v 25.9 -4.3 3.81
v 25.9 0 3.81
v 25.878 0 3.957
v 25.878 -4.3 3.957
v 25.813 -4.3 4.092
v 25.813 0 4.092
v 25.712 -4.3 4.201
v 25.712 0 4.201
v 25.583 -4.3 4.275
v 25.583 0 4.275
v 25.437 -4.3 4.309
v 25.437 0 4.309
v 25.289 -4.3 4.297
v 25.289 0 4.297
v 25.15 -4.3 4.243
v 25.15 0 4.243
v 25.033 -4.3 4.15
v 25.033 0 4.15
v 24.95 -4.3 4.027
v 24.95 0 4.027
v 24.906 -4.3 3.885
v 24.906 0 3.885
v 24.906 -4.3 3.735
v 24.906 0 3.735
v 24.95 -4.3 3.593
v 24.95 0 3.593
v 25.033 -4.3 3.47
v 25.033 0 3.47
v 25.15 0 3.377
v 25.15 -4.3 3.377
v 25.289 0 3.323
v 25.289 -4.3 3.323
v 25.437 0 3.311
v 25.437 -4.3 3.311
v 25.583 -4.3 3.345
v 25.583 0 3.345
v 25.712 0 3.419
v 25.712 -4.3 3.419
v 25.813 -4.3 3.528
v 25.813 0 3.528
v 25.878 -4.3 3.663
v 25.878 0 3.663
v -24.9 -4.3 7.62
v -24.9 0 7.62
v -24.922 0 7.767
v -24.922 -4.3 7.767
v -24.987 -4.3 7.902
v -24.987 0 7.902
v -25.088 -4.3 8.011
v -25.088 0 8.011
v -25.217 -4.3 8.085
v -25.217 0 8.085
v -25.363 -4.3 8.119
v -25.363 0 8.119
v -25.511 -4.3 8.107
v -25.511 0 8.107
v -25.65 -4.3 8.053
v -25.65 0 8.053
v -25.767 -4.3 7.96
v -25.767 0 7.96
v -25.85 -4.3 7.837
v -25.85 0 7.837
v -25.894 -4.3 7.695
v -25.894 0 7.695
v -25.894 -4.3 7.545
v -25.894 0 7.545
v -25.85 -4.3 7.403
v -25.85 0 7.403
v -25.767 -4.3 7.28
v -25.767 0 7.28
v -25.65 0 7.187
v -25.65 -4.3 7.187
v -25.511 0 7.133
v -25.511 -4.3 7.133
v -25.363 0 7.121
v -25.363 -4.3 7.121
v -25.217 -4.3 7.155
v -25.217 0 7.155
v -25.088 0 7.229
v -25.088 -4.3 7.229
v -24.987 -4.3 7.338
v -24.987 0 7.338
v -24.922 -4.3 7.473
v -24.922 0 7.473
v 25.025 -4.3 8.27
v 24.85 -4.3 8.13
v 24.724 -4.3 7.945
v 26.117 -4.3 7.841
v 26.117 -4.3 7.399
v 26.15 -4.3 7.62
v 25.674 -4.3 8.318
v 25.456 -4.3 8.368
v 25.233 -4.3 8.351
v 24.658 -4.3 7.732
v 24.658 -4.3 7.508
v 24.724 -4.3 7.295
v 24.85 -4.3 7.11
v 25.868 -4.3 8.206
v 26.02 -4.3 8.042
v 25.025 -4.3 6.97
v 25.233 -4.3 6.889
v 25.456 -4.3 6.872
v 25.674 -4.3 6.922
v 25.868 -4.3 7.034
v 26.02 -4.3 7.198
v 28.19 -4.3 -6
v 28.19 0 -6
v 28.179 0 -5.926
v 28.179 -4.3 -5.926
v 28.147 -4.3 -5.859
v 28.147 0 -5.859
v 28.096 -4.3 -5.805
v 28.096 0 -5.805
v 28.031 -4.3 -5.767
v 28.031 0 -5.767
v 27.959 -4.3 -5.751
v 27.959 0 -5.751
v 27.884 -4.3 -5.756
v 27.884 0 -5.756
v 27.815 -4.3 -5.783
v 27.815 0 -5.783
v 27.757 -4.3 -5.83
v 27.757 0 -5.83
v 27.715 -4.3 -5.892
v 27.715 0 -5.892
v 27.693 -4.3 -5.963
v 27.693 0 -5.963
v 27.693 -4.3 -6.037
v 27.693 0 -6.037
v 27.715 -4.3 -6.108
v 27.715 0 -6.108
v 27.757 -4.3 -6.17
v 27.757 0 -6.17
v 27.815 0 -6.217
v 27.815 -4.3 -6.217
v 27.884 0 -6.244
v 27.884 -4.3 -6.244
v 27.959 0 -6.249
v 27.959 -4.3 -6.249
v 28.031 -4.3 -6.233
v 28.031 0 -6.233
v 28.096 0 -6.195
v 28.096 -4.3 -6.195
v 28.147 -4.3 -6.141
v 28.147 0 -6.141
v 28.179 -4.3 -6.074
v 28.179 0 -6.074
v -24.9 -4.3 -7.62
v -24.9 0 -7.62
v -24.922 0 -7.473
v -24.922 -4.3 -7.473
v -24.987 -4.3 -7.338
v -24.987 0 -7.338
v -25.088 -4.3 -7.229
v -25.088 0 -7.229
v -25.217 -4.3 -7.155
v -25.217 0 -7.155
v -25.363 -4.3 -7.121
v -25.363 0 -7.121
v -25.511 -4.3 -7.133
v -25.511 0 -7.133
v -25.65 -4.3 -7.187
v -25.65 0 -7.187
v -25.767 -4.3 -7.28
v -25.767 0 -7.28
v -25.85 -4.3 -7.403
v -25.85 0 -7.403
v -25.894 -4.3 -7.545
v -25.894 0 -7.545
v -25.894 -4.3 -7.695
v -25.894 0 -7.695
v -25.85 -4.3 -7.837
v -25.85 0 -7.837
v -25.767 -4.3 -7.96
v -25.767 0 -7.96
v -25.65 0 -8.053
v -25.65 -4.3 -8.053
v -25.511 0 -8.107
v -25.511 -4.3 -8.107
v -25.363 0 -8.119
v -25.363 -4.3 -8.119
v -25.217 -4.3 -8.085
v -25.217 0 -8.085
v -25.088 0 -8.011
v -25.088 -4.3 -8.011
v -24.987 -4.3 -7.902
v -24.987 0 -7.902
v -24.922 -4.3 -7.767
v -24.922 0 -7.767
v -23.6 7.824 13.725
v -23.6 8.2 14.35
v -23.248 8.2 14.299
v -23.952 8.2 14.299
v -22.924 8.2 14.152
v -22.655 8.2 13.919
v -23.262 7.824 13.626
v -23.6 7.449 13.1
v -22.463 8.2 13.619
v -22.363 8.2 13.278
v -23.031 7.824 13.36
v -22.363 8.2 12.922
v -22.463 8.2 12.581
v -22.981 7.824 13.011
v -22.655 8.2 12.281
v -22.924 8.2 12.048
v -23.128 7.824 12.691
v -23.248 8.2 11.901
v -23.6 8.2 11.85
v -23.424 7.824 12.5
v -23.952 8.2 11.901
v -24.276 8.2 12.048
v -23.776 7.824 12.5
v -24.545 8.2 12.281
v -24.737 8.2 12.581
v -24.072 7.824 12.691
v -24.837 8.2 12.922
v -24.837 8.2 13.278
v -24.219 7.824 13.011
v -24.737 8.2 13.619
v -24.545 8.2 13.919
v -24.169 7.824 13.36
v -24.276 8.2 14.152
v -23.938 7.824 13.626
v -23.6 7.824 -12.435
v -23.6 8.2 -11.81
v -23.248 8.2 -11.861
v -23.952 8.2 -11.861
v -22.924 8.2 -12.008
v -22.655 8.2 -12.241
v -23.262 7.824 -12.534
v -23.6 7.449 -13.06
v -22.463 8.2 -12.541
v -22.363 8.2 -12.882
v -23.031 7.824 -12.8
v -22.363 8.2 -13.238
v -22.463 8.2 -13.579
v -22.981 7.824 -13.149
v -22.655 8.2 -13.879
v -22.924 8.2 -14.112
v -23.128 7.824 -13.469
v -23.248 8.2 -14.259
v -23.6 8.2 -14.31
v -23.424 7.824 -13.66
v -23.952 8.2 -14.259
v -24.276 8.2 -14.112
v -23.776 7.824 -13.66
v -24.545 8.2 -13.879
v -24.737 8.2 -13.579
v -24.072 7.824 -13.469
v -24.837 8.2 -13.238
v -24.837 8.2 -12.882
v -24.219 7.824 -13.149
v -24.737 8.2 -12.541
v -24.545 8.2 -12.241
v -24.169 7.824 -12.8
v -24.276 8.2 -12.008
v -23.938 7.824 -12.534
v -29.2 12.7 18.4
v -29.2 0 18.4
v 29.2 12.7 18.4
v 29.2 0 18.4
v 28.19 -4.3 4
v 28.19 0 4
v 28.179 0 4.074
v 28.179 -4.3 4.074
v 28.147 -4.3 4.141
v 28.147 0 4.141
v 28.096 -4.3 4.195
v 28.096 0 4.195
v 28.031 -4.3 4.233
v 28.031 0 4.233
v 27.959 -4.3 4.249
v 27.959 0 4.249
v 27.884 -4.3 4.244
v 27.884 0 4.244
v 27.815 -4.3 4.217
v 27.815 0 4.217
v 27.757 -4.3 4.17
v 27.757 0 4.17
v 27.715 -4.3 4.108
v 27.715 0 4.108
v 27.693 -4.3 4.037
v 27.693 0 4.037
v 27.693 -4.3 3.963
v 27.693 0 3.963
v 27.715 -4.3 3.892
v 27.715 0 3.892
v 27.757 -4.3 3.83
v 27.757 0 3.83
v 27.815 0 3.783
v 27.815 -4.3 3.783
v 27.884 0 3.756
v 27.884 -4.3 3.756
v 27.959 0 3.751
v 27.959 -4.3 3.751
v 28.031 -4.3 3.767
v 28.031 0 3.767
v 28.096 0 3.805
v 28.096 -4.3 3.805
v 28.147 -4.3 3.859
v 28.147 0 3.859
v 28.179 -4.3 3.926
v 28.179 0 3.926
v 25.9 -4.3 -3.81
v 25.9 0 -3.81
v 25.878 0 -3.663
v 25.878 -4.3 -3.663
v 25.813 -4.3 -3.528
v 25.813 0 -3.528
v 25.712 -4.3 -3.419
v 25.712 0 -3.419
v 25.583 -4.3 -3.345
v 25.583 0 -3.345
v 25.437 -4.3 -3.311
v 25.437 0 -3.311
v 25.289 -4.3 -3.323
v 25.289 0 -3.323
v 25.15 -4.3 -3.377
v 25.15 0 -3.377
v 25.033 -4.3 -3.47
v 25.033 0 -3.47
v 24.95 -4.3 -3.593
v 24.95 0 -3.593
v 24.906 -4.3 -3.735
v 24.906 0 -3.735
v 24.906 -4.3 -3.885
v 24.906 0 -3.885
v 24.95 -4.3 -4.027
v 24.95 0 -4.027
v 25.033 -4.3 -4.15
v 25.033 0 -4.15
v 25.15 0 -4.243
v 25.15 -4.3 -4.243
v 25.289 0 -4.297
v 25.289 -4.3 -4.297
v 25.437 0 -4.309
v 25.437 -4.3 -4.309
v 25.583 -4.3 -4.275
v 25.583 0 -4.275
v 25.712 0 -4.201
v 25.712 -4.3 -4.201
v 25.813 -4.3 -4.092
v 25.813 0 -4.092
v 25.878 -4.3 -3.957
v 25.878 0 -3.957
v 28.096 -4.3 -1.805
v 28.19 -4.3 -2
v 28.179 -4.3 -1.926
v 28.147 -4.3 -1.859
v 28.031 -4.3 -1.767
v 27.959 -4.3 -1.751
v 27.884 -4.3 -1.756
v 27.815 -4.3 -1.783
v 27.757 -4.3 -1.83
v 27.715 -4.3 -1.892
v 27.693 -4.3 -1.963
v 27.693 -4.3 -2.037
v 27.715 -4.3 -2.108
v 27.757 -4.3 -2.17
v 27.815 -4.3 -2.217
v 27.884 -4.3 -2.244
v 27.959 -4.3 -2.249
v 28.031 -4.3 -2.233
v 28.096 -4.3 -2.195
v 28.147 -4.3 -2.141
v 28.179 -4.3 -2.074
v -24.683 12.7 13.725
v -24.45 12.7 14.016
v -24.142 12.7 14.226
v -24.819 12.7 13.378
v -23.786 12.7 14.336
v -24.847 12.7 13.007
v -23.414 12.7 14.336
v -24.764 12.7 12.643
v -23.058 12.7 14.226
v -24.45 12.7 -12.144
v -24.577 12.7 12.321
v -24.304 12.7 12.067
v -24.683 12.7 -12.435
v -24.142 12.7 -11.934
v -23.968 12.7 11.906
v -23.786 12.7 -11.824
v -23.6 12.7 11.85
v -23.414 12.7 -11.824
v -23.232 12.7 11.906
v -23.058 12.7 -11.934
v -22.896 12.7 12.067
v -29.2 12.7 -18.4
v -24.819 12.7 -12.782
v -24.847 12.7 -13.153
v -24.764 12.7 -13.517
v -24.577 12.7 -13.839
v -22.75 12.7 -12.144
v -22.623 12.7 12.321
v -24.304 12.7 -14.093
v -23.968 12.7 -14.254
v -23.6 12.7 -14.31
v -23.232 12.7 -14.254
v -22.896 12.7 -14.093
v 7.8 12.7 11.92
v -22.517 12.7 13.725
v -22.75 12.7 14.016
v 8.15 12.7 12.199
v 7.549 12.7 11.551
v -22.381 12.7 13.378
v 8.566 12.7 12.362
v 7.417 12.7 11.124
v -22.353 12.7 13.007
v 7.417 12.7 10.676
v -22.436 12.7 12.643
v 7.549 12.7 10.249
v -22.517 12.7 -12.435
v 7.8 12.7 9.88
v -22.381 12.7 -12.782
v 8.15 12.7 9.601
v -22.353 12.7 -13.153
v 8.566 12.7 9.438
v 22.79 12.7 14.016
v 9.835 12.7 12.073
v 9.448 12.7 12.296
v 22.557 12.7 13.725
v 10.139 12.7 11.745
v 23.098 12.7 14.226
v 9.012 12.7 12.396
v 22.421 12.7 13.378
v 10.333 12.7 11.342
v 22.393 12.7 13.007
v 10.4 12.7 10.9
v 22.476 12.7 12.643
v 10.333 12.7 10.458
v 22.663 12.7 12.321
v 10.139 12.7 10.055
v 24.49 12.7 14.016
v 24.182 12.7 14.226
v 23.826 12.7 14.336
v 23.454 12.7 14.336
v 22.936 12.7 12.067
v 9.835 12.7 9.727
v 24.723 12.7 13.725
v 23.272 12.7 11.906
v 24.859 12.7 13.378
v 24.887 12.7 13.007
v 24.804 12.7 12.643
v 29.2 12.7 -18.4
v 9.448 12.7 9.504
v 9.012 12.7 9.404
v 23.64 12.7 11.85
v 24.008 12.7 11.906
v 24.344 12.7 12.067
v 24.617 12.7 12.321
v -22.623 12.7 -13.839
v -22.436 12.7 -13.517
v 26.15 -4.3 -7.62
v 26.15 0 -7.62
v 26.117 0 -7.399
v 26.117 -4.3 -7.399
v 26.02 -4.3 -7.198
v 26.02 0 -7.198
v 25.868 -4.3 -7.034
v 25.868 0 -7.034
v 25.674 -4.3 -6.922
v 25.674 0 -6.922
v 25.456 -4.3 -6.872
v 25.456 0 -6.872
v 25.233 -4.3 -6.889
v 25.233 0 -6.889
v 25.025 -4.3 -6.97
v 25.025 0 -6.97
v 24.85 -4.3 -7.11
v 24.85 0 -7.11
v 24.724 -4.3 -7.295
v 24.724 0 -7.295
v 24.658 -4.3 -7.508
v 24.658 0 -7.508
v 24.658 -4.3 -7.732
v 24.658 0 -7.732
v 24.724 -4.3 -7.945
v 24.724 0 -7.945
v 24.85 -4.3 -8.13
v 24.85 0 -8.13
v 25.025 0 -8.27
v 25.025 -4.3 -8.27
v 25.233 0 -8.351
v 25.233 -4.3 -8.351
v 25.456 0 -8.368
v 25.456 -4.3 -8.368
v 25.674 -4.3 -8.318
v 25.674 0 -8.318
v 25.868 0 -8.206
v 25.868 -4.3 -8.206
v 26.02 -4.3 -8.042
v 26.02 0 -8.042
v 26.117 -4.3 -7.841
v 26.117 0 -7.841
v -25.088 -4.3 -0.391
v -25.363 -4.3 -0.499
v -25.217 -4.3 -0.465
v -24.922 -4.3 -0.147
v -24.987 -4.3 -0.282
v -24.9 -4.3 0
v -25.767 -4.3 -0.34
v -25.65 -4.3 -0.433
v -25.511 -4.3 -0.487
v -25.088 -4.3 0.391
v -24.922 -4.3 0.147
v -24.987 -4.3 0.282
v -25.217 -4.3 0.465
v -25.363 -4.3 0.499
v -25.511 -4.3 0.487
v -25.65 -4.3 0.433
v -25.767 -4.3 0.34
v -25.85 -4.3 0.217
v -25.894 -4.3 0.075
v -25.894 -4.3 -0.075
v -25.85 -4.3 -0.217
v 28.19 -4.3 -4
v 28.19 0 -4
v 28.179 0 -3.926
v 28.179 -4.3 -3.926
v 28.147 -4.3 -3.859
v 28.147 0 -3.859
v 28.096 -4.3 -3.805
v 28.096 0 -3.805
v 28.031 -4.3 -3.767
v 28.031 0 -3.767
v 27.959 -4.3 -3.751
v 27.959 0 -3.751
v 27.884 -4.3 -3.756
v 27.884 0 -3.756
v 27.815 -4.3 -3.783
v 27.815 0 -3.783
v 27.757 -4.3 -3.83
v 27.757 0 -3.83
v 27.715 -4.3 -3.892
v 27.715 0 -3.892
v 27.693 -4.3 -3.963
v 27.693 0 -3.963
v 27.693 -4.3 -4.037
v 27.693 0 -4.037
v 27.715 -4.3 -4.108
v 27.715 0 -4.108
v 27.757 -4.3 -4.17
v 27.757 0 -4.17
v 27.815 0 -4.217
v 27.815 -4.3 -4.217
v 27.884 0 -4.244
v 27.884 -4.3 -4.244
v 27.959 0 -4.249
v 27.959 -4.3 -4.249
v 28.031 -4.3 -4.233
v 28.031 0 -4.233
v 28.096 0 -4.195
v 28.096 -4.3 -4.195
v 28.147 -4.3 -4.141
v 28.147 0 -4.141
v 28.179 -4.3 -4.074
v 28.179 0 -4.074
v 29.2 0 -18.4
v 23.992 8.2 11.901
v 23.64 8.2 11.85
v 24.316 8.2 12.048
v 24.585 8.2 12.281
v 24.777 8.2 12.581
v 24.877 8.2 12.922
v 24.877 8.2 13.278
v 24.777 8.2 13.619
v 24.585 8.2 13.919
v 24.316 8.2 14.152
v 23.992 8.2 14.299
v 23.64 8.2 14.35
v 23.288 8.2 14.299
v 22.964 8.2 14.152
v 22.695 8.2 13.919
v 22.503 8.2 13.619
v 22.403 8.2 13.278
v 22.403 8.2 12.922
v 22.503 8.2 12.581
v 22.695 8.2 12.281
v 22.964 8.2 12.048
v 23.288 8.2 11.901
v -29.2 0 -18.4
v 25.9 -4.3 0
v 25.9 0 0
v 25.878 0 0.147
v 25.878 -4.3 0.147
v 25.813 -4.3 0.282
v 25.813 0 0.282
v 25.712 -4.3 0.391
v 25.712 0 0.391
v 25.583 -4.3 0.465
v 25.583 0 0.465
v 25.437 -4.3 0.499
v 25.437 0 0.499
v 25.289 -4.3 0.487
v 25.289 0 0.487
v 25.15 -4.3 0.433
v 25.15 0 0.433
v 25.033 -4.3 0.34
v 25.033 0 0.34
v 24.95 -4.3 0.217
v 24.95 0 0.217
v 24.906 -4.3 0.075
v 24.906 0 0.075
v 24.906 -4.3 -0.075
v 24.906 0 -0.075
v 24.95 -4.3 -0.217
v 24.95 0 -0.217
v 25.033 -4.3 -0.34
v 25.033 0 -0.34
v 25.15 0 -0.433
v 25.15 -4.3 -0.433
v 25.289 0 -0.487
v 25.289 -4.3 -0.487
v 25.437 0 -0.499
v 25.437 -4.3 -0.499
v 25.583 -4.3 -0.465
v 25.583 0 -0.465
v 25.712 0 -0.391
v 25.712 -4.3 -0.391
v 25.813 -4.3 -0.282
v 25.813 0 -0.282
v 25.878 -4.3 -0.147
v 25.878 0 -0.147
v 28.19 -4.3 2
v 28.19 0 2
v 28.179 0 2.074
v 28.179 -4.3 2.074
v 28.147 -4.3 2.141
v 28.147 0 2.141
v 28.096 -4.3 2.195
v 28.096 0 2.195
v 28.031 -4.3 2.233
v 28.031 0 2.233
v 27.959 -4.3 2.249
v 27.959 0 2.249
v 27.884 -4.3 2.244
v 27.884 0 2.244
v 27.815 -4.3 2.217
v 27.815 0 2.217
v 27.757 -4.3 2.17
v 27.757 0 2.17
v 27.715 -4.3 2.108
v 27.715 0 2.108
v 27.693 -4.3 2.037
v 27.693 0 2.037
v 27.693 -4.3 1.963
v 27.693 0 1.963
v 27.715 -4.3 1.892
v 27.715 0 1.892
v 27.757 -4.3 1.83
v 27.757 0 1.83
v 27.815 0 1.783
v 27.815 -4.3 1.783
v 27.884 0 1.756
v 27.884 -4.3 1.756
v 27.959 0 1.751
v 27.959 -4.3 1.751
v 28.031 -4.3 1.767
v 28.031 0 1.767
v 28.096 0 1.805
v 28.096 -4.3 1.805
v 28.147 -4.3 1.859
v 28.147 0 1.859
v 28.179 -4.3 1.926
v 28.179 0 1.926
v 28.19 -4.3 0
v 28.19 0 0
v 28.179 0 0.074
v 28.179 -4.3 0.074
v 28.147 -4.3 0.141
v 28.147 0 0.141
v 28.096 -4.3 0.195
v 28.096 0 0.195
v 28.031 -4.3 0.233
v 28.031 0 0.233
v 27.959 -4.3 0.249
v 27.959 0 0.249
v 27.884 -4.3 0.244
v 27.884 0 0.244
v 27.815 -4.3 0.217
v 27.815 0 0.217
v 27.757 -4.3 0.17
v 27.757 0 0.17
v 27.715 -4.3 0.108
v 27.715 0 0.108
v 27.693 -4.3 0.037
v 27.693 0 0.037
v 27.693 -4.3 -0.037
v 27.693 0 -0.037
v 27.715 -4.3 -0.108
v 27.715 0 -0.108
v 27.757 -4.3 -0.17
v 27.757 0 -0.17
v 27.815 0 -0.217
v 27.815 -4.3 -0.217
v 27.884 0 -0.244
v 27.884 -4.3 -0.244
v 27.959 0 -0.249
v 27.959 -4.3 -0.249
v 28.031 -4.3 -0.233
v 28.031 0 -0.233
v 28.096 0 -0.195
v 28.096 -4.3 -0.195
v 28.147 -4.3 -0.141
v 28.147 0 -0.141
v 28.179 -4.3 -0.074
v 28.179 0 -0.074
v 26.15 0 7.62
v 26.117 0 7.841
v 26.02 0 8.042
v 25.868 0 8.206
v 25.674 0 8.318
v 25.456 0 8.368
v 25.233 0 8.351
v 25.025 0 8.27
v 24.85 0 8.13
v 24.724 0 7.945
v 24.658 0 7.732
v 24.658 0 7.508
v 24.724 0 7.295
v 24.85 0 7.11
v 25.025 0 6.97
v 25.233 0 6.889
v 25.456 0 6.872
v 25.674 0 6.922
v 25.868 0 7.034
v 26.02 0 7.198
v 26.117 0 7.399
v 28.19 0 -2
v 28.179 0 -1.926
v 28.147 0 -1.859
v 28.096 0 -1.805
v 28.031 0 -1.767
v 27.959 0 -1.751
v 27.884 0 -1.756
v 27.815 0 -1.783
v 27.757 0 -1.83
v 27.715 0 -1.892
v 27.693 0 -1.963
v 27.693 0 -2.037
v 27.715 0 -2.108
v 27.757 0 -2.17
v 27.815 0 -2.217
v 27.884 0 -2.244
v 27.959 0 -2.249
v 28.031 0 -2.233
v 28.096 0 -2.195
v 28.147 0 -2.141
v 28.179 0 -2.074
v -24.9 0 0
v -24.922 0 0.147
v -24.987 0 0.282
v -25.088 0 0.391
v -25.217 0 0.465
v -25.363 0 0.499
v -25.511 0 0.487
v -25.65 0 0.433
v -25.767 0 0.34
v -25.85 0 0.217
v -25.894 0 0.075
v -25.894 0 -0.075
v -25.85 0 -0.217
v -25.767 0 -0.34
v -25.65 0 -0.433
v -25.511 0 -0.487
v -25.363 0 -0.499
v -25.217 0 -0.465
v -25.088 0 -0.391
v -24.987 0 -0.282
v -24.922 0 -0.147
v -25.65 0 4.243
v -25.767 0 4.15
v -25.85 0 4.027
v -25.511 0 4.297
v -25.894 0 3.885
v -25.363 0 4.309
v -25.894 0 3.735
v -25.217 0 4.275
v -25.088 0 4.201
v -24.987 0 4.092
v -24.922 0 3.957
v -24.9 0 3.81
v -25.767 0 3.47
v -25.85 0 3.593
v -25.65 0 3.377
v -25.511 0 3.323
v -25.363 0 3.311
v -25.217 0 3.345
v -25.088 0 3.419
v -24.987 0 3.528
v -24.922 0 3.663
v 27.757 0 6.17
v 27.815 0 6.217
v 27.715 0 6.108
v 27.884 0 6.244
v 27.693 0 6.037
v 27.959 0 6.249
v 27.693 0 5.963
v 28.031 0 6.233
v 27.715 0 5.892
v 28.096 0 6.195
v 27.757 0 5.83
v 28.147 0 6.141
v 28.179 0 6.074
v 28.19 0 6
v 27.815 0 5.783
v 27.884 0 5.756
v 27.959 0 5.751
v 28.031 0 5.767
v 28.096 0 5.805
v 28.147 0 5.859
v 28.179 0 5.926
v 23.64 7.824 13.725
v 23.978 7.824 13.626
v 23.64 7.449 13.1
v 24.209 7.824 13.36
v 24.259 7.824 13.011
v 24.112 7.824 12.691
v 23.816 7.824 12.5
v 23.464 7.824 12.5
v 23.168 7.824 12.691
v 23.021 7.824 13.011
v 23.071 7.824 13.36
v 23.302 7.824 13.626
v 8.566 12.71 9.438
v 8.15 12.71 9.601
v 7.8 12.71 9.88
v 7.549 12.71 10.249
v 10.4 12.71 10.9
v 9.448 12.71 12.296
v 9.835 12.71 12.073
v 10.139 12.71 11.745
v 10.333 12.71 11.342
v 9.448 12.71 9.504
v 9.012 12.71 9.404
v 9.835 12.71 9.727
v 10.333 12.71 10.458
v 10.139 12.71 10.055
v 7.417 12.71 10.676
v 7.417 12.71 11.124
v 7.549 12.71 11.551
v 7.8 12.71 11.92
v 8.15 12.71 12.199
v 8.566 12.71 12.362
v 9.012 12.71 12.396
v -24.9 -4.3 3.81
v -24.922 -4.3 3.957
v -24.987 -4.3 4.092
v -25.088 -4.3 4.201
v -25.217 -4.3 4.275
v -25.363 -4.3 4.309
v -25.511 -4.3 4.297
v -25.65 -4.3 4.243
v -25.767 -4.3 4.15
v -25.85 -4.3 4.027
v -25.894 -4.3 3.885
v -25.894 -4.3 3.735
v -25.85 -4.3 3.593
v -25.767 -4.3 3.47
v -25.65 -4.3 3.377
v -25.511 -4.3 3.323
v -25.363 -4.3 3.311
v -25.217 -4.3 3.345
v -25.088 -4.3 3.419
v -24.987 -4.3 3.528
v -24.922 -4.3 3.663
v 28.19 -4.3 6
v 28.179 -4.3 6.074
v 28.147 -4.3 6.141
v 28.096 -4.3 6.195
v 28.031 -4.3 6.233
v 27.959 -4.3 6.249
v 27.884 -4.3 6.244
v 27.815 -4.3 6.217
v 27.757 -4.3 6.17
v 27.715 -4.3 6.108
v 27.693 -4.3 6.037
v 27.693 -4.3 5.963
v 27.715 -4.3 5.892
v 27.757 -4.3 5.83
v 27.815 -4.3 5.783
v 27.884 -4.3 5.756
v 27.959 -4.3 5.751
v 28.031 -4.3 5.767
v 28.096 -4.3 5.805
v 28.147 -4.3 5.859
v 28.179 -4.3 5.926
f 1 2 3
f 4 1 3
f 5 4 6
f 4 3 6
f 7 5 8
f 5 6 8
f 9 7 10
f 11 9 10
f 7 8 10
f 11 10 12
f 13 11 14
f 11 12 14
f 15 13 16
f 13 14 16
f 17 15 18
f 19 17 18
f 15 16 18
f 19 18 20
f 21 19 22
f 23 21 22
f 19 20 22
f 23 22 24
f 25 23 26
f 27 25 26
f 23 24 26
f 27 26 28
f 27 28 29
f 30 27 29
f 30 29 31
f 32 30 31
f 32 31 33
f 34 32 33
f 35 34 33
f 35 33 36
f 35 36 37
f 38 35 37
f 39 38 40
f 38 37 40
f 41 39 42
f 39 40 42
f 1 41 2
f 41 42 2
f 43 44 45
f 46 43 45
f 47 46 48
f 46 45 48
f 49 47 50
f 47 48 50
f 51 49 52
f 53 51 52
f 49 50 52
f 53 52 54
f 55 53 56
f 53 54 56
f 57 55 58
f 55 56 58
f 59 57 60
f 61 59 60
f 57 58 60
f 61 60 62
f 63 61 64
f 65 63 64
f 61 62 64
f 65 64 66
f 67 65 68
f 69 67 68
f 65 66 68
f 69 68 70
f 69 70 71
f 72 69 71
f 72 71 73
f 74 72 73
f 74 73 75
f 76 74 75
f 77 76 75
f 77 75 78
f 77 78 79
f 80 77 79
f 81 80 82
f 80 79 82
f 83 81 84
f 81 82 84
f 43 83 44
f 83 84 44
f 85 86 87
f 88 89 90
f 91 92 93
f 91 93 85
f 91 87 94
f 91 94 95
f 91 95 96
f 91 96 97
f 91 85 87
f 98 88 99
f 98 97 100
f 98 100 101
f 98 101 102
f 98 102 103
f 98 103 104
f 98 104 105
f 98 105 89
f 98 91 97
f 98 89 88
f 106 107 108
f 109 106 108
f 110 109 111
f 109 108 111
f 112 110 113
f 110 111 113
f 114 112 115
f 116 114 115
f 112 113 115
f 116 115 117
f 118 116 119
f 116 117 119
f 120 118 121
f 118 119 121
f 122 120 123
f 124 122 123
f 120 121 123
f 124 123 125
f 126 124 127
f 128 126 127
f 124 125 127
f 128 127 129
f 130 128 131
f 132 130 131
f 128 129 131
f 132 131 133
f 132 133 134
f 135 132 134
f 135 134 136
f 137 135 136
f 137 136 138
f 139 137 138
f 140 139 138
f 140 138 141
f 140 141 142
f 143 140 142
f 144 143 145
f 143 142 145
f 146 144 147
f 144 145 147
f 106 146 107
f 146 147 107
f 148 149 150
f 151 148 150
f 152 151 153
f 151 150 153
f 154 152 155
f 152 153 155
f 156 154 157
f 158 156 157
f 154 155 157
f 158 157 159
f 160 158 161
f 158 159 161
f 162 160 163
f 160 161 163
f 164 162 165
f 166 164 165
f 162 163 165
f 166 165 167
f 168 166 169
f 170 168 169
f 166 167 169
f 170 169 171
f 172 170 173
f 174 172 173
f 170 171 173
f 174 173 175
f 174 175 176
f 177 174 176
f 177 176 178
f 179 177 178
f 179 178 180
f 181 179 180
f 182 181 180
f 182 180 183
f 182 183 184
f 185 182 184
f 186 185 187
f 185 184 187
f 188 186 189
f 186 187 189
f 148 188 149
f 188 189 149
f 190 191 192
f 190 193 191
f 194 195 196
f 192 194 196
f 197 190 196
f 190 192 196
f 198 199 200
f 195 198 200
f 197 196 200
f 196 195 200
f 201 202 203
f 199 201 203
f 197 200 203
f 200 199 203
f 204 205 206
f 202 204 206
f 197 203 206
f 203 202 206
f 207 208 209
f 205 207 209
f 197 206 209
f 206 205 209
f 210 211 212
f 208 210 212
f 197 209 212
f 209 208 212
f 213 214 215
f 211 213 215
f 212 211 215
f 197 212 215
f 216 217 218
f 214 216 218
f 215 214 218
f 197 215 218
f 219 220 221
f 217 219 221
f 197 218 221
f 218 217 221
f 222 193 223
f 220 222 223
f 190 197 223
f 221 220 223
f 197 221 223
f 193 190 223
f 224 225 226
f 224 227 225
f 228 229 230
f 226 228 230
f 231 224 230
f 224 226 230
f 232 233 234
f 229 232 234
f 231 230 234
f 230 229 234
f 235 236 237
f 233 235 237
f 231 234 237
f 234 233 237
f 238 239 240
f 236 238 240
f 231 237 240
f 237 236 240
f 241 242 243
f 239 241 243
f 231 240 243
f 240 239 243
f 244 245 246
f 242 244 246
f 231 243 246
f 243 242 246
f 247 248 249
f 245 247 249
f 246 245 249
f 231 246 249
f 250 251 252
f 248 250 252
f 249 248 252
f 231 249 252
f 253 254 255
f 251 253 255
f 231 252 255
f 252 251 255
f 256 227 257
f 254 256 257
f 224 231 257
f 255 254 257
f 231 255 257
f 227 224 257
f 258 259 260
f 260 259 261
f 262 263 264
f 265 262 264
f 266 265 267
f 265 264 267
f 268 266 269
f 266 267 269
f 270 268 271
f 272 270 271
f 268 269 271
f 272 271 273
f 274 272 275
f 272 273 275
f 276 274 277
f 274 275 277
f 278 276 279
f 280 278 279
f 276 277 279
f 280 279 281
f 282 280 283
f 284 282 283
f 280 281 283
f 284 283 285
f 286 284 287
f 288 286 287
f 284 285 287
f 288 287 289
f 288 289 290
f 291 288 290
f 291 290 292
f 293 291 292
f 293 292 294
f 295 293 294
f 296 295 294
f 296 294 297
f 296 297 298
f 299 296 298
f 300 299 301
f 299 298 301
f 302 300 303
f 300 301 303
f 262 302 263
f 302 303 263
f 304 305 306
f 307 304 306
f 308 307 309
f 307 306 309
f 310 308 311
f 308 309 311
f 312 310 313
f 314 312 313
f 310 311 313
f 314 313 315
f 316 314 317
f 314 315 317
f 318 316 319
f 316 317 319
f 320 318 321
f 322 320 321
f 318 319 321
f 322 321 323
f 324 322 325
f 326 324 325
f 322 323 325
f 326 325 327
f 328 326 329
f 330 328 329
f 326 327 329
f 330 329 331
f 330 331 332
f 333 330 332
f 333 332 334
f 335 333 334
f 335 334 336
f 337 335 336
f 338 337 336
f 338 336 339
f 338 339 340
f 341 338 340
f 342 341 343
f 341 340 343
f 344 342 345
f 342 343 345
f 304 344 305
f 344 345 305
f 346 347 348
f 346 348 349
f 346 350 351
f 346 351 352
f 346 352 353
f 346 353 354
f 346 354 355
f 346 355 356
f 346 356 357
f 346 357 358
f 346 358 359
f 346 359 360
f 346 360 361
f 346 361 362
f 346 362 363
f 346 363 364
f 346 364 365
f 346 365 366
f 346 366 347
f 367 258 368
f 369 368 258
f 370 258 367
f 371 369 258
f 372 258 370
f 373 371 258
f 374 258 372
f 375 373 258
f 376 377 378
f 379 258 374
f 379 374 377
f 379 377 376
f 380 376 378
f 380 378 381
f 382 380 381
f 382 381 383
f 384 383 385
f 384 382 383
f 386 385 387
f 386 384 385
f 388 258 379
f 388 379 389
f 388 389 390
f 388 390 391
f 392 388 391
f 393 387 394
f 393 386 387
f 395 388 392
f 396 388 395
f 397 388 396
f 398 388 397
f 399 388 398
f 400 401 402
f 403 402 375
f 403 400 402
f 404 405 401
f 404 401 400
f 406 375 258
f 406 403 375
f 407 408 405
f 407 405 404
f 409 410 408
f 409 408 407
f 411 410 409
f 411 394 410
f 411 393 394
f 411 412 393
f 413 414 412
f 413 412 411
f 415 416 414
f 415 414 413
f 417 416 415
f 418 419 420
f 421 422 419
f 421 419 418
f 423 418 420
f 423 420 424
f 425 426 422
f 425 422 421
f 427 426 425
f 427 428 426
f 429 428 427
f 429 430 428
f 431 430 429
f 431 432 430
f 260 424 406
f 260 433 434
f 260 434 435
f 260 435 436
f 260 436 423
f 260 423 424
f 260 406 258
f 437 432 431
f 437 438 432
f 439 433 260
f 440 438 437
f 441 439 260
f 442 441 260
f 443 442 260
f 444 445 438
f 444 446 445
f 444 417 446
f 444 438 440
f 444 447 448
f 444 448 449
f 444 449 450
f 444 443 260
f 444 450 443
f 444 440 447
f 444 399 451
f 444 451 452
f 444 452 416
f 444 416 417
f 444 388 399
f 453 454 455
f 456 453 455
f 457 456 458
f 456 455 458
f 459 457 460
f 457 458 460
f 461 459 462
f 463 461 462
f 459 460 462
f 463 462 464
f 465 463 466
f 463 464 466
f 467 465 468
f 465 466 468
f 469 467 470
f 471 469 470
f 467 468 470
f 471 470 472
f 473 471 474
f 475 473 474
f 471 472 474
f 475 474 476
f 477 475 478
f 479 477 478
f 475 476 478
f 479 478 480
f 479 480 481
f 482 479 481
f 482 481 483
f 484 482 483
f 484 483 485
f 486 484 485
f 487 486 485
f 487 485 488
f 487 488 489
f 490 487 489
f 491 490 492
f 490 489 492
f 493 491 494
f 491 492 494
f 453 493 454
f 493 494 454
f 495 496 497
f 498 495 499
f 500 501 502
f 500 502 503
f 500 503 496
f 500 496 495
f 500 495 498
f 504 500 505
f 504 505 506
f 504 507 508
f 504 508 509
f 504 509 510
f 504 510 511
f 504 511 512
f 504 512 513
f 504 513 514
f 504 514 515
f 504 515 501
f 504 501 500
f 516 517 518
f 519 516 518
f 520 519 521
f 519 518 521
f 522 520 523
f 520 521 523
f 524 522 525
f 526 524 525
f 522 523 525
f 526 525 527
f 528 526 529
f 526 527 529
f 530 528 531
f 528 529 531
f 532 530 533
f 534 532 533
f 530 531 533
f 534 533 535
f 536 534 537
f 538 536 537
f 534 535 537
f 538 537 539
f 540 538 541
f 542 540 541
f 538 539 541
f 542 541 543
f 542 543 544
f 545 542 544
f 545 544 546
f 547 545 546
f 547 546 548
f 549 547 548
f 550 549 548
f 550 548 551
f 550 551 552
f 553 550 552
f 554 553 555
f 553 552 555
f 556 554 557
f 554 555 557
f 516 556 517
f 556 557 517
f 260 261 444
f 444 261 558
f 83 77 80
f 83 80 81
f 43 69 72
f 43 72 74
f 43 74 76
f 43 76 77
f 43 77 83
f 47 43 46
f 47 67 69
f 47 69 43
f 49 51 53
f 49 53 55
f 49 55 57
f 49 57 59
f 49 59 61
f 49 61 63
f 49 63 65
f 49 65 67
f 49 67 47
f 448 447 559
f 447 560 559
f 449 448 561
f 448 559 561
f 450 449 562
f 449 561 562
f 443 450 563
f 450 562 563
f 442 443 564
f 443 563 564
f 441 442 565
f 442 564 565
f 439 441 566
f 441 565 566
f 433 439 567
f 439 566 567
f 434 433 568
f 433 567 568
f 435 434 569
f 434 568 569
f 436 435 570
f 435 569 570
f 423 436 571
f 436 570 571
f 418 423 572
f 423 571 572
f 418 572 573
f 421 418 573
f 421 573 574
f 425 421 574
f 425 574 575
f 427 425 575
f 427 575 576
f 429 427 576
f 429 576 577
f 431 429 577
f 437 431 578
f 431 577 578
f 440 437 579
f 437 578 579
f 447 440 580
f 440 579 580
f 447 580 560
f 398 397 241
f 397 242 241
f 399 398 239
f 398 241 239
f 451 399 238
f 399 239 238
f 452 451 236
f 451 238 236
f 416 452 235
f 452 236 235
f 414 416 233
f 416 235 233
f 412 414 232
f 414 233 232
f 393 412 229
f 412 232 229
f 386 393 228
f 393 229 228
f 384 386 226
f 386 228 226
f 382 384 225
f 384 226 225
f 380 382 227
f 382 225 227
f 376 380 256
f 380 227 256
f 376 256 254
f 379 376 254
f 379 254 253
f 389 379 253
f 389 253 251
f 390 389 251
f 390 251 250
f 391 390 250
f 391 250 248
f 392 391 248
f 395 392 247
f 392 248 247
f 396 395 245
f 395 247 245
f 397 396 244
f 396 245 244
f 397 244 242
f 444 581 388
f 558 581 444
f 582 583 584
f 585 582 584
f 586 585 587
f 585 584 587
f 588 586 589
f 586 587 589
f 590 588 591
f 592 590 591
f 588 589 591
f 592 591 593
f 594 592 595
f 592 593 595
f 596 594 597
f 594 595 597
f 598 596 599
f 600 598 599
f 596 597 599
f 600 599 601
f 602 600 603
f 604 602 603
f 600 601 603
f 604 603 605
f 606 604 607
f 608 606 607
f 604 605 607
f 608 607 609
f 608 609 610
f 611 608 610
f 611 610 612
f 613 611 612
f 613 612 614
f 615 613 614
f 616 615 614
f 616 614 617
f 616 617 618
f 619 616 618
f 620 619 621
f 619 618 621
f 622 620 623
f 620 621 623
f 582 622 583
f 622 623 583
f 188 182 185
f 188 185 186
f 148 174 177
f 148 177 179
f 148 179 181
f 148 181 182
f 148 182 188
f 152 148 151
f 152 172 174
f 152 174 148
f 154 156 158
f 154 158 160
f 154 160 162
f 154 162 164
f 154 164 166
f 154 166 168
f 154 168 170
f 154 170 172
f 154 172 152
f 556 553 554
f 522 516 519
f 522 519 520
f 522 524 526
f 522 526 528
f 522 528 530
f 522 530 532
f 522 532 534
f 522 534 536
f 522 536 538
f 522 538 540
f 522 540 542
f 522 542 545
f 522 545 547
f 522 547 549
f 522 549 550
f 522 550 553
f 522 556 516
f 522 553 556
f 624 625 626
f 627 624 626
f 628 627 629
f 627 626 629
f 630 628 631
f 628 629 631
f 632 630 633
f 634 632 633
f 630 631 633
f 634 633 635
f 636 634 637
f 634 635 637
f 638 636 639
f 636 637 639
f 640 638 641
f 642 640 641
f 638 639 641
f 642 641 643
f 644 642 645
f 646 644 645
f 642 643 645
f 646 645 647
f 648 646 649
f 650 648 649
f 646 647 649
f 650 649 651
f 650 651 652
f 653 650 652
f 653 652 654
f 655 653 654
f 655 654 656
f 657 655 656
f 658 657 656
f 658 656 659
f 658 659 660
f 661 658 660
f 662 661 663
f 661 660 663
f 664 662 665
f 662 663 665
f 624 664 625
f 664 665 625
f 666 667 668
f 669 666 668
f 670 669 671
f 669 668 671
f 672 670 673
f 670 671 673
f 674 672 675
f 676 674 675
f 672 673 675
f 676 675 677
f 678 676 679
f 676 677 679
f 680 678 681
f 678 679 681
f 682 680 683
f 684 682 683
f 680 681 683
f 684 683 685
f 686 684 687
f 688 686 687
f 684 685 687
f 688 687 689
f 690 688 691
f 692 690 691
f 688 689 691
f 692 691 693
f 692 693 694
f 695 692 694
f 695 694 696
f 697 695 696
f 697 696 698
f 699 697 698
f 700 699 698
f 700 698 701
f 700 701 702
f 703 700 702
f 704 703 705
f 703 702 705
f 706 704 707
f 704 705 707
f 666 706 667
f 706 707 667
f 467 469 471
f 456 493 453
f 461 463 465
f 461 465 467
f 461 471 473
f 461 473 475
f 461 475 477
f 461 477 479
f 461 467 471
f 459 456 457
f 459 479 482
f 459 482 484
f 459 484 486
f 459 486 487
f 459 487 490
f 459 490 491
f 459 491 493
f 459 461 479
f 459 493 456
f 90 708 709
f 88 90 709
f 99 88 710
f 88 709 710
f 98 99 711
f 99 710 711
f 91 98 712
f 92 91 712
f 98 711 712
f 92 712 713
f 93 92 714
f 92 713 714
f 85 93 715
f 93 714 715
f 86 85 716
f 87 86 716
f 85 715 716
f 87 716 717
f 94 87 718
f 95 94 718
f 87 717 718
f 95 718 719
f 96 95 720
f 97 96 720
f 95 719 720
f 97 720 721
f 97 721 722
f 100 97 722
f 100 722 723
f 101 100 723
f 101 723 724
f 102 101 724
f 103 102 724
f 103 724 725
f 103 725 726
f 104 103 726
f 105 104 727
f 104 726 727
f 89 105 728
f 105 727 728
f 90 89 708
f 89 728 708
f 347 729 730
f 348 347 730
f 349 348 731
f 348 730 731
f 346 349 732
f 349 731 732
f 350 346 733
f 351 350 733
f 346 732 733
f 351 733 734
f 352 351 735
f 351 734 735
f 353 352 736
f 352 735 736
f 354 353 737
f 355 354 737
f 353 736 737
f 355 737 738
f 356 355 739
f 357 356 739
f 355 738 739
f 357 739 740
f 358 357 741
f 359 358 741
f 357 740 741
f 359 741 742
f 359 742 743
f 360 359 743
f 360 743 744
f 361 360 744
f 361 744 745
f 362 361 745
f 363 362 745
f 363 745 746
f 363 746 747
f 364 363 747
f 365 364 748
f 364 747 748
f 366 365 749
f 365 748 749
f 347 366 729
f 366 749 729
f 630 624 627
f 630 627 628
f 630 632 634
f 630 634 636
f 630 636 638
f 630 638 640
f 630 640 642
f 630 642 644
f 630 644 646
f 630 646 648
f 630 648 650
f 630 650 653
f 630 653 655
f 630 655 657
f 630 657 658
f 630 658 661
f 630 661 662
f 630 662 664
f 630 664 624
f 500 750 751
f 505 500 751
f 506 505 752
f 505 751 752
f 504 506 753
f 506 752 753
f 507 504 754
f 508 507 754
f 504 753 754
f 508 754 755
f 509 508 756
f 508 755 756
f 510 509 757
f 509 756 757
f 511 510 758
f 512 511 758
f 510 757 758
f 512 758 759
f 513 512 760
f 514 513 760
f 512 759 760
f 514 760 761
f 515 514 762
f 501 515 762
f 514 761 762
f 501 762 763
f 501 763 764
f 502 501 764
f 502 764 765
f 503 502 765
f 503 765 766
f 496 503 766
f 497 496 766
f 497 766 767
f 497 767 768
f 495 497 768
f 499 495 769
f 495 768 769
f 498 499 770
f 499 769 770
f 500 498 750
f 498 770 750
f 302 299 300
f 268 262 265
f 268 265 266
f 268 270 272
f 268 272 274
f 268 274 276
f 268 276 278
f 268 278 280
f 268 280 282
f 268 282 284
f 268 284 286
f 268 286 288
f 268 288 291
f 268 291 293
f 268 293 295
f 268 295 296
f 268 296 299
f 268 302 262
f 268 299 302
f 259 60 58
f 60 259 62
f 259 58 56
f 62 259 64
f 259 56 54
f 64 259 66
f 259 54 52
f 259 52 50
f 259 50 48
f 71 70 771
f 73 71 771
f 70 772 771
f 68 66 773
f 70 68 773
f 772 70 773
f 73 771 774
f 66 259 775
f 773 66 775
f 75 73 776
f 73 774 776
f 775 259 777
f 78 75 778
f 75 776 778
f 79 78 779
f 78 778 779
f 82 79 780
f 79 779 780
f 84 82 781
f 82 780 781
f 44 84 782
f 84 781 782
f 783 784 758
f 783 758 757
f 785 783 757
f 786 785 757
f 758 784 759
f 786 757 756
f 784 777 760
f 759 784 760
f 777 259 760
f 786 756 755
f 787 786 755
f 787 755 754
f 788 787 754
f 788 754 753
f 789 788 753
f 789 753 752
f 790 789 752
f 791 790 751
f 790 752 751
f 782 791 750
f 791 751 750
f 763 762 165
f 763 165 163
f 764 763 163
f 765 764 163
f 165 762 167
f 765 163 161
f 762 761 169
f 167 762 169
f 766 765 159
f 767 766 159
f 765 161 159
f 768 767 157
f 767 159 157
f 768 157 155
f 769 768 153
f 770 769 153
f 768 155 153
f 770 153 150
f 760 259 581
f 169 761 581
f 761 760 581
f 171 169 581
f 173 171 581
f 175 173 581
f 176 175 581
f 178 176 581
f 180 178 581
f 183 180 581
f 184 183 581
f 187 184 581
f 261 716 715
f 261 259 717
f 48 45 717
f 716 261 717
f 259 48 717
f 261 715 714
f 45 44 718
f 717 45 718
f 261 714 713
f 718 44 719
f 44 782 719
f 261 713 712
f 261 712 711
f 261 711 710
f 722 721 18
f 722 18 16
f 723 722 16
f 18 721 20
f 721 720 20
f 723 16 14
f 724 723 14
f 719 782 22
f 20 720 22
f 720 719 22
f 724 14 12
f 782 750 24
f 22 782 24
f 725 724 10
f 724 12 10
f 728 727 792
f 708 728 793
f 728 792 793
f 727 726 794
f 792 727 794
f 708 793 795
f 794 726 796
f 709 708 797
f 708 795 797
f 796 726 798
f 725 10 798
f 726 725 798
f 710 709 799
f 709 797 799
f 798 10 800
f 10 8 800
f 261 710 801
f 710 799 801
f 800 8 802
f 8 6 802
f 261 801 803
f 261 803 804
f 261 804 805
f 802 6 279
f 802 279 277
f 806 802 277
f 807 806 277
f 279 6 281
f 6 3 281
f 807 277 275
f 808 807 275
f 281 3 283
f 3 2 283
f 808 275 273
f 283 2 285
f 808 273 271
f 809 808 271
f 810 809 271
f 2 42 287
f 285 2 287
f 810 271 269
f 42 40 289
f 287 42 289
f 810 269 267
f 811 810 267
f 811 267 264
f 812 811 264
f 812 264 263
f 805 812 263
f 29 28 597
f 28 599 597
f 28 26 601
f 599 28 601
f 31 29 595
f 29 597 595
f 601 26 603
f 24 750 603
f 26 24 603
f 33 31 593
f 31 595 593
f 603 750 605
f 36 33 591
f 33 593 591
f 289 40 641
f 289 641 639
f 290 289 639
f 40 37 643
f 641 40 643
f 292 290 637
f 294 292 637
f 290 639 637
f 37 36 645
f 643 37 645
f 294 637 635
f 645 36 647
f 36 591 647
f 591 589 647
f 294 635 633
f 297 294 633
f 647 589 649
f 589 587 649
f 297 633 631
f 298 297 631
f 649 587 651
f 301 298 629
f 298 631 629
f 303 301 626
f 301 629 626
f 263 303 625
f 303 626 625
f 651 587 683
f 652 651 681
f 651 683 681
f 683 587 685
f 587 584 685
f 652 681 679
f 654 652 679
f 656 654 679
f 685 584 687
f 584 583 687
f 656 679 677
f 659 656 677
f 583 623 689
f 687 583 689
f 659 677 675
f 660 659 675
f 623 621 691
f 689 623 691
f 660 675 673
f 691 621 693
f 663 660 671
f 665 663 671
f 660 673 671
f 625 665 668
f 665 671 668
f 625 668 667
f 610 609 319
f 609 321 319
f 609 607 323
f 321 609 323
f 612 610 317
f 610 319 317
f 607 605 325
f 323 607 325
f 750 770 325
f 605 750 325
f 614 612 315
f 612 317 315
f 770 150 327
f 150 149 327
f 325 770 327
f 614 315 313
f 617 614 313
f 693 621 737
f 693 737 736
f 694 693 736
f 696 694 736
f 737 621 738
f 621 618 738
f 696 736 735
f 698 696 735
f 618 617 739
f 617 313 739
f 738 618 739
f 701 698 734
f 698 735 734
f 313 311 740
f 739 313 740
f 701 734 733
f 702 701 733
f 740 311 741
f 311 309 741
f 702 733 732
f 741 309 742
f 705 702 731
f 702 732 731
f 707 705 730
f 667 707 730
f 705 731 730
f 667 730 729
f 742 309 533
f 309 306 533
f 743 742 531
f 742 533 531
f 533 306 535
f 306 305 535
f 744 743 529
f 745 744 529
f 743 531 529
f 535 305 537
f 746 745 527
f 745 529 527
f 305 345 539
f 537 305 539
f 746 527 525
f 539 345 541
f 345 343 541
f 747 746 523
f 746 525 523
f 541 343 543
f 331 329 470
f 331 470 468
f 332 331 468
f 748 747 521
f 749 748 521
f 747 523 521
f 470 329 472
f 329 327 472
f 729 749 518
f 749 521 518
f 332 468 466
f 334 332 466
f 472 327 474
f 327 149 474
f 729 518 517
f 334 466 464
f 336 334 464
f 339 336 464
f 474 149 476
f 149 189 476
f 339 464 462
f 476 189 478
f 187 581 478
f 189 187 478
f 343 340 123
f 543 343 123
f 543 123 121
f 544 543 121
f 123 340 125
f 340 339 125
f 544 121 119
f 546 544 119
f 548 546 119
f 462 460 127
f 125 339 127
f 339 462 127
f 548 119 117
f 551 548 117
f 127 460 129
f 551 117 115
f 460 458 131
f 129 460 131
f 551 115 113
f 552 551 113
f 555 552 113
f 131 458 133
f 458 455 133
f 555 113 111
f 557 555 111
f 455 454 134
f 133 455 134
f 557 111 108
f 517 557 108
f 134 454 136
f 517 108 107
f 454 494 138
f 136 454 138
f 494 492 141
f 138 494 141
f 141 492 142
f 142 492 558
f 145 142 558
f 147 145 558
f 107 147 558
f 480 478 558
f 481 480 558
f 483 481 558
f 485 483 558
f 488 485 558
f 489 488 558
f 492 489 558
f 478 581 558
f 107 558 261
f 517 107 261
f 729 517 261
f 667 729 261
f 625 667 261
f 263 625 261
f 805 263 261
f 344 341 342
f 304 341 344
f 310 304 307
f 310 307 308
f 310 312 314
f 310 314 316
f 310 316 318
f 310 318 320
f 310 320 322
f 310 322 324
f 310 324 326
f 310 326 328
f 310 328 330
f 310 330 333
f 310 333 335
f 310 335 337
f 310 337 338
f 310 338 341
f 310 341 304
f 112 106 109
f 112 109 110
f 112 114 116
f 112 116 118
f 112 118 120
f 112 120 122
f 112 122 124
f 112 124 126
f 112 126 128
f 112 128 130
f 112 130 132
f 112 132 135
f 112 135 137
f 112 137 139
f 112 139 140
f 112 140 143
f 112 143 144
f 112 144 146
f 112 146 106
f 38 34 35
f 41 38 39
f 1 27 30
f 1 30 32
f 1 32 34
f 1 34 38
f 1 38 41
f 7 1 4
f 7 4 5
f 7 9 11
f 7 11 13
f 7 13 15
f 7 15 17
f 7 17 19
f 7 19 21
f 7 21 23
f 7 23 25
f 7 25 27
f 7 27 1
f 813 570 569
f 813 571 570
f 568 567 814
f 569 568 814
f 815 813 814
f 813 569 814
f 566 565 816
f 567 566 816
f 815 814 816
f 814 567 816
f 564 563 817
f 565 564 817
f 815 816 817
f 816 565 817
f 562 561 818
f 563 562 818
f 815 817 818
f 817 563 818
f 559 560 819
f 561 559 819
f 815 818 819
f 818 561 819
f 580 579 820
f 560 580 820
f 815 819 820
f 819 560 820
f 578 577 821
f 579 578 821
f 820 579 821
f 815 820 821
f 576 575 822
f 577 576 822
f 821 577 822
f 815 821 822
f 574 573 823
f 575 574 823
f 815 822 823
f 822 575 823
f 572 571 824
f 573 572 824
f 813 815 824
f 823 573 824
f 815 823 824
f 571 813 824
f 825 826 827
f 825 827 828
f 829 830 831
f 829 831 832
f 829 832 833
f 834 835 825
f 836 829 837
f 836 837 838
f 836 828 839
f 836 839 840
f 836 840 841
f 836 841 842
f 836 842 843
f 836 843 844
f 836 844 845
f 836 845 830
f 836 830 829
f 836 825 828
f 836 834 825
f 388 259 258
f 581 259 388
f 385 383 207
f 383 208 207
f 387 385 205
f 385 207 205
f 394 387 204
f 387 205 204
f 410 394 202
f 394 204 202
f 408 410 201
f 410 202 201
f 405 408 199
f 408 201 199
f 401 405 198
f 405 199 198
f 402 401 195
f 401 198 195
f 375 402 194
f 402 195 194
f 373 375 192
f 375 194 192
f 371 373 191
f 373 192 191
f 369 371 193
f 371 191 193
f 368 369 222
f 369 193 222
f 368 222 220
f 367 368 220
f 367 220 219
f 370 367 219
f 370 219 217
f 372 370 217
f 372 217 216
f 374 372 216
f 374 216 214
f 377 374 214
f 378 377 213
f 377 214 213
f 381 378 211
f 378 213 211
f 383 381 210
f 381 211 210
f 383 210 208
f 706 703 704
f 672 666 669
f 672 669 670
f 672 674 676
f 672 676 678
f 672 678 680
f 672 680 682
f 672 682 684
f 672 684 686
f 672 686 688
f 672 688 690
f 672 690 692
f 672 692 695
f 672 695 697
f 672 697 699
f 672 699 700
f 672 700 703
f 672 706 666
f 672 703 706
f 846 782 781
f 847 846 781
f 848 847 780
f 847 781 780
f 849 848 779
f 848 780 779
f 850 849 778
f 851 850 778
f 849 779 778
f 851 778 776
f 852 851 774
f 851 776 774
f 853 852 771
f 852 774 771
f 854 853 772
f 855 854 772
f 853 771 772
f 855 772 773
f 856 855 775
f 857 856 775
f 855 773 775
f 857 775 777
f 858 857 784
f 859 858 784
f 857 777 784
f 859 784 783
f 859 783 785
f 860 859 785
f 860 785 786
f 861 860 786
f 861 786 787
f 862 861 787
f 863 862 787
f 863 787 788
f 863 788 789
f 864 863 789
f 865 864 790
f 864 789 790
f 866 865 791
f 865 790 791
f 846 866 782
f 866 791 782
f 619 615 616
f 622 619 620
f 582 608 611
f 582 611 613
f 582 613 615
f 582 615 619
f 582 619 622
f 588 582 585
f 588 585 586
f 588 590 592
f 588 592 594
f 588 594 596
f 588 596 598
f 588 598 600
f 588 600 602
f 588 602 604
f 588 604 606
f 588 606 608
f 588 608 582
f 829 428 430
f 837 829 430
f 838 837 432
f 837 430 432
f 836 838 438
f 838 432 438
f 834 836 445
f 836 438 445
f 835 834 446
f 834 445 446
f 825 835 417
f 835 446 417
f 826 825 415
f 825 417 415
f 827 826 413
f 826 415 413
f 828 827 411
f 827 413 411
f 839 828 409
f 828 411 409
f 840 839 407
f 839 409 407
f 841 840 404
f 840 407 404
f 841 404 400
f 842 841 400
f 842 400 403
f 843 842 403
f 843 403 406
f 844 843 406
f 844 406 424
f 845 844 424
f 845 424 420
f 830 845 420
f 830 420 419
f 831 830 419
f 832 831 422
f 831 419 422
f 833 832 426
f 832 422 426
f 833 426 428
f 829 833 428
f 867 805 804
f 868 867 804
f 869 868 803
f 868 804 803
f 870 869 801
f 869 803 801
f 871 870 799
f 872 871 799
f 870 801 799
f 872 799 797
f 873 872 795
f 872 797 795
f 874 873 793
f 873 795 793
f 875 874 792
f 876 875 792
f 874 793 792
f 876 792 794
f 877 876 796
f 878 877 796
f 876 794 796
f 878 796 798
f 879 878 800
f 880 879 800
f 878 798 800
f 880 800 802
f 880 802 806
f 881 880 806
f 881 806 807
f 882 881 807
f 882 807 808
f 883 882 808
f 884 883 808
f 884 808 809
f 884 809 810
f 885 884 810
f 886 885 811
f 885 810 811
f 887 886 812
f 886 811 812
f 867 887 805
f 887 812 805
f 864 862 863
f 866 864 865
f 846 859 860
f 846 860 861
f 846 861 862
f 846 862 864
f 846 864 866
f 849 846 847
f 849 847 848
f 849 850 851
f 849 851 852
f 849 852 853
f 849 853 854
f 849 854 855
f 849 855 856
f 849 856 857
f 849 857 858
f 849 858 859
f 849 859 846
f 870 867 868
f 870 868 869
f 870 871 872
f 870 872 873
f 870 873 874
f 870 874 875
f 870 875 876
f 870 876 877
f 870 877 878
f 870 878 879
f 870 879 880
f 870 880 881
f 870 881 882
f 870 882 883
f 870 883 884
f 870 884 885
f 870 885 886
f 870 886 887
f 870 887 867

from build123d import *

# Parameters (mm, degrees)
SKETCH1_W                 = 58.4
SKETCH1_H                 = 36.8
BOSS_EXTRUDE1_DEPTH       = 12.7
SKETCH2_R                 = 0.5
SKETCH2_R_2               = 0.75
SKETCH2_R_3               = 0.25
BOSS_EXTRUDE2_DEPTH       = 4.3
M3X0_5_TAPPED_HOLE1_D     = 2.5
M3X0_5_TAPPED_HOLE1_DEPTH = 4.5
M3X0_5_TAPPED_HOLE1_TIP   = 0.751075774
SKETCH6_R                 = 1.5
BOSS_EXTRUDE3_DEPTH       = 0.01


with BuildPart() as part:
    # Sketch1 → Boss-Extrude1 (new body)
    with BuildSketch(Plane(origin=(0, 0, 0), x_dir=(1, 0, 0), z_dir=(0, 1, 0))):
        Rectangle(SKETCH1_W, SKETCH1_H)
    extrude(amount=BOSS_EXTRUDE1_DEPTH)

    # Sketch2 → Boss-Extrude2 (add)
    with BuildSketch(Plane.XZ):
        with Locations((-25.4, 0)):
            Circle(SKETCH2_R)
        with Locations((-25.4, 3.81)):
            Circle(SKETCH2_R)
        with Locations((-25.4, 7.62)):
            Circle(SKETCH2_R)
        with Locations((-25.4, -7.62)):
            Circle(SKETCH2_R)
        with Locations((25.4, 7.62)):
            Circle(SKETCH2_R_2)
        with Locations((25.4, 3.81)):
            Circle(SKETCH2_R)
        with Locations((25.4, 0)):
            Circle(SKETCH2_R)
        with Locations((25.4, -3.81)):
            Circle(SKETCH2_R)
        with Locations((25.4, -7.62)):
            Circle(SKETCH2_R_2)
        with Locations((27.94, 0)):
            Circle(SKETCH2_R_3)
        with Locations((27.94, -2)):
            Circle(SKETCH2_R_3)
        with Locations((27.94, -4)):
            Circle(SKETCH2_R_3)
        with Locations((27.94, -6)):
            Circle(SKETCH2_R_3)
        with Locations((27.94, 2)):
            Circle(SKETCH2_R_3)
        with Locations((27.94, 4)):
            Circle(SKETCH2_R_3)
        with Locations((27.94, 6)):
            Circle(SKETCH2_R_3)
    extrude(amount=BOSS_EXTRUDE2_DEPTH)

    # M3x0.5 Tapped Hole1
    with Locations(Plane(origin=(-23.6, 12.7, -13.06), x_dir=(0, 0, 1), z_dir=(0, 1, 0))):
        with Locations((0, 0), (26.16, 0), (26.16, 47.24)):
            Hole(M3X0_5_TAPPED_HOLE1_D / 2, depth=M3X0_5_TAPPED_HOLE1_DEPTH)
            with Locations((0, 0, -(M3X0_5_TAPPED_HOLE1_DEPTH + M3X0_5_TAPPED_HOLE1_TIP / 2))):  # 118° drill point
                Cone(0, M3X0_5_TAPPED_HOLE1_D / 2, M3X0_5_TAPPED_HOLE1_TIP, mode=Mode.SUBTRACT)

    # Sketch6 → Boss-Extrude3 (add)
    with BuildSketch(Plane(origin=(0, 12.7, 0), x_dir=(1, 0, 0), z_dir=(0, 1, 0))):
        with Locations((8.9, -10.9)):
            Circle(SKETCH6_R)
    extrude(amount=BOSS_EXTRUDE3_DEPTH)


solid = part.part
